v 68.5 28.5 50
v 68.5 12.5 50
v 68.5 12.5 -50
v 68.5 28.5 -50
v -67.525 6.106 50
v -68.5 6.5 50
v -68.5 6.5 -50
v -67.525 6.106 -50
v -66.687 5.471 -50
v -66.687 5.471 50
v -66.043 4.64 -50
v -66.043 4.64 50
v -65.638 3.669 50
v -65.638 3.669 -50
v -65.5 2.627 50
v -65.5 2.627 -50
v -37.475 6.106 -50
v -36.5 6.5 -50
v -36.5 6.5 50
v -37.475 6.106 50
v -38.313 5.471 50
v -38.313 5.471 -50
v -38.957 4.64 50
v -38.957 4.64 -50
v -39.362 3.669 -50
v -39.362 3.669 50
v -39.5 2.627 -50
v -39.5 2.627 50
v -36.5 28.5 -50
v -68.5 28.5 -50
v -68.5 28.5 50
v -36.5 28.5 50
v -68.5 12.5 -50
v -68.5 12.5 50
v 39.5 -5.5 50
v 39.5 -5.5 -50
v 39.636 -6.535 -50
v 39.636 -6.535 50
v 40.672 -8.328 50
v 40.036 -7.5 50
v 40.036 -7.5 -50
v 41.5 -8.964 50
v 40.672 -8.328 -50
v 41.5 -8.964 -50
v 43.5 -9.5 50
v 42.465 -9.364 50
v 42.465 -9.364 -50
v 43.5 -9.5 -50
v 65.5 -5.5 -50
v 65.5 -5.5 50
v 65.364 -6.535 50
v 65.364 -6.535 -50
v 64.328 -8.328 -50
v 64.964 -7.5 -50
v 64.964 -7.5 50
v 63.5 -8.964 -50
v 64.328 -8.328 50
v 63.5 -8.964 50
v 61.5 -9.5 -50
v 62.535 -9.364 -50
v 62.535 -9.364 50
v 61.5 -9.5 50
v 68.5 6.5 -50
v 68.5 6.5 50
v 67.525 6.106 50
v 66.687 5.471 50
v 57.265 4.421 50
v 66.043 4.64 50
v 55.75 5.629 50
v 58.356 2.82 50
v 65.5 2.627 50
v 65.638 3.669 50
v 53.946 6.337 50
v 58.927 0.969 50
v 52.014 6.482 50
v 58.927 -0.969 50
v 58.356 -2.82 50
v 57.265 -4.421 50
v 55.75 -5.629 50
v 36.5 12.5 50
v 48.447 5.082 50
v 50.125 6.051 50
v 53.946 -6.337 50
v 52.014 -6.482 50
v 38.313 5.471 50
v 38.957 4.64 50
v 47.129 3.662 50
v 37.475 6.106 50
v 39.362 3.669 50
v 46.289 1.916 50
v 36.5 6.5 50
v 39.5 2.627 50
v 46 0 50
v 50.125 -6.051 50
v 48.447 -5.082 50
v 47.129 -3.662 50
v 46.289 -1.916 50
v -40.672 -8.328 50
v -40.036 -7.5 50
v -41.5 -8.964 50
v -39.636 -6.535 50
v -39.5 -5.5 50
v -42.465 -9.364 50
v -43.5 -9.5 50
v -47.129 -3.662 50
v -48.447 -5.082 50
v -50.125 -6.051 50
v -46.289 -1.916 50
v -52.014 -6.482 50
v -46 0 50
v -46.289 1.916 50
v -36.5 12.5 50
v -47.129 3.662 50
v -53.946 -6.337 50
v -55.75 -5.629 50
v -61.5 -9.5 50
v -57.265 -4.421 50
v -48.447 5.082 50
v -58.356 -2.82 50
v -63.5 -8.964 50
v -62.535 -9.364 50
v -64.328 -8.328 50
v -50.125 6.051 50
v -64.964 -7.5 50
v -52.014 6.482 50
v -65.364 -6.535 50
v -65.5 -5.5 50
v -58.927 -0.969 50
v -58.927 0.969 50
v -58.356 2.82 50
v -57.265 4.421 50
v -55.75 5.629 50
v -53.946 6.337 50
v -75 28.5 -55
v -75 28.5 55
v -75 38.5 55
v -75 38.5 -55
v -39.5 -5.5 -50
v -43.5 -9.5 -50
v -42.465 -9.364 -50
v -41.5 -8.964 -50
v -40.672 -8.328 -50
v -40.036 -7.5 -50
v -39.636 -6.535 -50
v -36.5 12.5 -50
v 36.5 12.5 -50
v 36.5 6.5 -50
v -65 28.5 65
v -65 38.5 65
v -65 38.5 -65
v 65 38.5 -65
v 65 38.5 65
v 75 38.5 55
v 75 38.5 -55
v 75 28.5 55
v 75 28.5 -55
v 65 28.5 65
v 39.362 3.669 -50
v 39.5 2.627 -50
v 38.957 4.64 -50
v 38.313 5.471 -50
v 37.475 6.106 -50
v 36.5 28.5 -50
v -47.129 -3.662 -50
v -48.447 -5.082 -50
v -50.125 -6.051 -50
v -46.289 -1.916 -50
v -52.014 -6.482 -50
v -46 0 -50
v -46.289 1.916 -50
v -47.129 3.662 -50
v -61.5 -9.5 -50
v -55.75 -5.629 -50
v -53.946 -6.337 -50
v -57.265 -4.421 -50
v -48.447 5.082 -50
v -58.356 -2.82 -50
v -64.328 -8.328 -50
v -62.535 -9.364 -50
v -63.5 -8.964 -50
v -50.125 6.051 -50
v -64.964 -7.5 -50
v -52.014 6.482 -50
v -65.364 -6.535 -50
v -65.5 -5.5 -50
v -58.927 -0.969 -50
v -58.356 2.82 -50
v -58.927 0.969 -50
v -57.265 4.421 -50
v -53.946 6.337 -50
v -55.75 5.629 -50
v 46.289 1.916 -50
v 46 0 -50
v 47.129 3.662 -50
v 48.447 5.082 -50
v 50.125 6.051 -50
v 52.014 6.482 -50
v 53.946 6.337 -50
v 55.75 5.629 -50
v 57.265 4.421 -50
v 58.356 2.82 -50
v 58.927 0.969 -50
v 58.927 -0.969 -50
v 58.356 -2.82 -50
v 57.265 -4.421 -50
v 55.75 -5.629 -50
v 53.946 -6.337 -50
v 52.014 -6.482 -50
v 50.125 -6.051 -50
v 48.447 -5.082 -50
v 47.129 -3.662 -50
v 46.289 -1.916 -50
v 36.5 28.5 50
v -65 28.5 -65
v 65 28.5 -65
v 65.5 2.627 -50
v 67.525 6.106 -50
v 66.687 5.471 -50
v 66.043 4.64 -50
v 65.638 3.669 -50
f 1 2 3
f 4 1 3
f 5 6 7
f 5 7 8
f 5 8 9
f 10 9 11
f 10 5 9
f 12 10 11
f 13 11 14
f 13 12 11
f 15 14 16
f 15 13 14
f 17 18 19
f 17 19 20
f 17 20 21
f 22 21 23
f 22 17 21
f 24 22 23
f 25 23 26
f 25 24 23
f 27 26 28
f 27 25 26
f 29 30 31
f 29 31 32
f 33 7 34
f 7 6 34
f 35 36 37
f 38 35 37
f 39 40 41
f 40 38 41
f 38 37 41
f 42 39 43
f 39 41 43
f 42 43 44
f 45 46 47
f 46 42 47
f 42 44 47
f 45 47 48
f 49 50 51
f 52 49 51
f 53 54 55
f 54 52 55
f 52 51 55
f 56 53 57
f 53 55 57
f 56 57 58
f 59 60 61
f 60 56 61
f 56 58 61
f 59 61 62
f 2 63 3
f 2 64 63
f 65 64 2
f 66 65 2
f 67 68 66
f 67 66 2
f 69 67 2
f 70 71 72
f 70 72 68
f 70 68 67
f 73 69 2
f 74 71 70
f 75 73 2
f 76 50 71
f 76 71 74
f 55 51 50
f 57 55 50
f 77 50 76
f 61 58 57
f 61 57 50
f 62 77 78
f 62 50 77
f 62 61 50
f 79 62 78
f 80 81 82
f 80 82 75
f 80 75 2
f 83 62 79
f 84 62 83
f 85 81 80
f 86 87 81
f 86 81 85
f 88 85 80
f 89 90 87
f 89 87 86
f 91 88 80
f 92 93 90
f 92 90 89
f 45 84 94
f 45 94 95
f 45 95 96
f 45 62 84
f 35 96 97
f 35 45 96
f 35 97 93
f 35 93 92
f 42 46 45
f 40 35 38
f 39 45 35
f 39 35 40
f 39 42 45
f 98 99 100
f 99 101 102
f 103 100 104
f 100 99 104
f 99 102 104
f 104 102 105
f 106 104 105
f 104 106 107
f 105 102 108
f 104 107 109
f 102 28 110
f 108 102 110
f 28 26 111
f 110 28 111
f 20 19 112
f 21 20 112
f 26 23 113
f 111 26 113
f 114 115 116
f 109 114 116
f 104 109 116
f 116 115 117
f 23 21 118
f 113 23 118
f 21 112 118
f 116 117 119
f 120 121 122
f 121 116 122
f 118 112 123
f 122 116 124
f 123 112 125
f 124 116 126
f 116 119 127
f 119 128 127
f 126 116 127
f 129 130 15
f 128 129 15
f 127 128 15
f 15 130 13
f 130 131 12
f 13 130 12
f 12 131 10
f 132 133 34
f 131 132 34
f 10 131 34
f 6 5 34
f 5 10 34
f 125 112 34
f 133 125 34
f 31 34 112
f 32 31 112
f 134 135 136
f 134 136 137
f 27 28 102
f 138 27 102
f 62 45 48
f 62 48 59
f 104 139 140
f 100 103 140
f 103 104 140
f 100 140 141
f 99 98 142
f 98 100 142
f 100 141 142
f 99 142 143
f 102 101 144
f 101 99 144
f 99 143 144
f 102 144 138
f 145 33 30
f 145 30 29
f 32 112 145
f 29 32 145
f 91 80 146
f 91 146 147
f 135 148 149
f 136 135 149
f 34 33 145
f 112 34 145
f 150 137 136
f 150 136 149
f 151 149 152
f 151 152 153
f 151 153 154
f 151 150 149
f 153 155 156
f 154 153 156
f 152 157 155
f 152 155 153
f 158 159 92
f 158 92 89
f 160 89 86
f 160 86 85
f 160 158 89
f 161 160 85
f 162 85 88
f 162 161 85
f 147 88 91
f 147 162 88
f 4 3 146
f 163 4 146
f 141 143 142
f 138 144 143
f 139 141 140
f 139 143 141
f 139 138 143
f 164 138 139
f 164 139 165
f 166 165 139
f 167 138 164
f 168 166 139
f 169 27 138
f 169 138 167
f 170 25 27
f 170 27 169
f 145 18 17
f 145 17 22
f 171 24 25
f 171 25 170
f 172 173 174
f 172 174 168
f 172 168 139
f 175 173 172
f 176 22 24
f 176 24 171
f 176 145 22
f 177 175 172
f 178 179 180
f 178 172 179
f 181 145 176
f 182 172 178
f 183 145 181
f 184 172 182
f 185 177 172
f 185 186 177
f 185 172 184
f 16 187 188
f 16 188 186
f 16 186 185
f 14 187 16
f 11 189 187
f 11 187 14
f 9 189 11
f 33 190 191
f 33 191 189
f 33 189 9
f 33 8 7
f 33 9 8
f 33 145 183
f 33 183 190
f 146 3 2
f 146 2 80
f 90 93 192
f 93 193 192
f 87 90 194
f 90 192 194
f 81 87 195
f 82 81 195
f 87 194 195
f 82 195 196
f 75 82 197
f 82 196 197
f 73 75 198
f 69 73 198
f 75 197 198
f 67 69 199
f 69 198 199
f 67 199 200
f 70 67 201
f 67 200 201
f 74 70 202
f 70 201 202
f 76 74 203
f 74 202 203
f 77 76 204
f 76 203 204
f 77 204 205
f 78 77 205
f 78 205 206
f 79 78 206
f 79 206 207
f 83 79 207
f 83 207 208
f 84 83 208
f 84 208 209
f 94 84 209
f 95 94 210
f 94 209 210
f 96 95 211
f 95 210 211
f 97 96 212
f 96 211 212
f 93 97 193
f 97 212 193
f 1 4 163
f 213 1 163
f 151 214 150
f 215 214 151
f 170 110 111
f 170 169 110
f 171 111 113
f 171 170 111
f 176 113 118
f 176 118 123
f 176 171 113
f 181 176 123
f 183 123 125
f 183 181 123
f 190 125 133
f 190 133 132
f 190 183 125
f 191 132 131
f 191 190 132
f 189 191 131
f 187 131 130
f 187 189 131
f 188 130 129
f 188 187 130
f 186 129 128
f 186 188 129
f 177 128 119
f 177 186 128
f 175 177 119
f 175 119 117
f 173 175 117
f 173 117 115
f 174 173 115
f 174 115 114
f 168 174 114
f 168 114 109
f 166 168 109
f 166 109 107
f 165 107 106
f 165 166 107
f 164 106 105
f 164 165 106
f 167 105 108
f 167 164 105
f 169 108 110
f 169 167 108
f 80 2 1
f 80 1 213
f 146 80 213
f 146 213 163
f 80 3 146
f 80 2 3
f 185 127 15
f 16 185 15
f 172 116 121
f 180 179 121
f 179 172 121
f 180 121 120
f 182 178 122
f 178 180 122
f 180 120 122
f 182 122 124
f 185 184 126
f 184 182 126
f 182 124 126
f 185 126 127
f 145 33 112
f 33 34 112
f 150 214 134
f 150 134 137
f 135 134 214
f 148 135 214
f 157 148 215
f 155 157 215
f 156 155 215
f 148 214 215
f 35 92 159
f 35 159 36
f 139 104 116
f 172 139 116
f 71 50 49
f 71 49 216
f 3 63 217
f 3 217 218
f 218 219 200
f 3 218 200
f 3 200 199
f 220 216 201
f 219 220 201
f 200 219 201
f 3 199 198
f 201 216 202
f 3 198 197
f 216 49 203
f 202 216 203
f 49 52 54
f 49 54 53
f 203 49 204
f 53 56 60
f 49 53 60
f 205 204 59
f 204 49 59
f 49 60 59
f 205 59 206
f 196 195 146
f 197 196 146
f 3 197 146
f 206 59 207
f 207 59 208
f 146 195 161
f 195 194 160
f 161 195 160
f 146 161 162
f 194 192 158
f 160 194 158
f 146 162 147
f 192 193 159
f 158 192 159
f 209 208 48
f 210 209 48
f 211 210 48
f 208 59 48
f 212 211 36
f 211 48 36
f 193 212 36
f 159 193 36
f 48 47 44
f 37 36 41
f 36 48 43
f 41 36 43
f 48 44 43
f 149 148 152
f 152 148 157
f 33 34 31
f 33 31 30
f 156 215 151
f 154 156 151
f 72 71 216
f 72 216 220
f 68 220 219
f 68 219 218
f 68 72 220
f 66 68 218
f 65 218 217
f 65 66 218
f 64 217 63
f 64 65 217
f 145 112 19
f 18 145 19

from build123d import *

# Parameters (mm, degrees)
SKETCH1_R           = 6.5
BOSS_EXTRUDE1_DEPTH = 50
SKETCH2_W           = 32
SKETCH2_H           = 100
BOSS_EXTRUDE2_DEPTH = 16
SKETCH5_W           = 150
SKETCH5_H           = 130
BOSS_EXTRUDE3_DEPTH = 10
CHAMFER1_SIZE       = 10
FILLET1_R           = 4
FILLET2_R           = 4


with BuildPart() as part:
    # Sketch1 → Boss-Extrude1 (new, symmetric)
    with BuildSketch(Plane.XY):
        Polygon((-39.5, -9.5), (-65.5, -9.5), (-65.5, 6.5), (-68.5, 6.5), (-68.5, 12.5), (-36.5, 12.5), (-36.5, 6.5), (-39.5, 6.5), align=None)
        with Locations((-52.5, 0)):
            Circle(SKETCH1_R, mode=Mode.SUBTRACT)
    extrude(amount=BOSS_EXTRUDE1_DEPTH, both=True)


with BuildPart() as body_2:
    # Sketch2 → Boss-Extrude2 (new body)
    with BuildSketch(Plane(origin=(0, 12.5, 0), x_dir=(1, 0, 0), z_dir=(0, 1, 0))):
        with Locations((-52.5, 0)):
            Rectangle(SKETCH2_W, SKETCH2_H)
    extrude(amount=BOSS_EXTRUDE2_DEPTH)


with BuildPart() as body_3:
    # Mirror5: mirrored copy
    add(body_2.part.mirror(Plane(origin=(0, 0, 0), x_dir=(0, 0, 1), z_dir=(1, 0, 0))))


with BuildPart() as body_4:
    # Mirror5 2: mirrored copy
    add(part.part.mirror(Plane(origin=(0, 0, 0), x_dir=(0, 0, 1), z_dir=(1, 0, 0))))

    # Fillet2
    # the kernel refuses this fillet: 4 mm, written as the material it adds along each edge
    with BuildSketch(Plane(origin=(65.5, 6.5, 50), x_dir=(1, 0, 0), z_dir=(0, 0, -1)), Plane(origin=(39.5, 6.5, -50), x_dir=(-1, 0, 0), z_dir=(0, 0, 1))) as fillet2_piece_1:
        with BuildLine():
            CenterArc((4, 3.872983346), FILLET2_R, 180, 75.522487814)
            Line((0, 3.872983346), (0, 0))
            Line((0, 0), (3, 0))
        make_face()
    extrude(amount=100)
    # the kernel refuses this fillet: 4 mm, written as the material it takes off along each edge
    with BuildSketch(Plane(origin=(65.5, -9.5, 60), x_dir=(-1, 0, 0), z_dir=(0, 0, -1)), Plane(origin=(39.5, -9.5, -60), x_dir=(1, 0, 0), z_dir=(0, 0, 1))) as fillet2_2_piece_1:
        with BuildLine():
            CenterArc((FILLET2_R, FILLET2_R), FILLET2_R, 180, 90)
            Line((0, FILLET2_R), (0, 0))
            Line((0, 0), (FILLET2_R, 0))
        make_face()
    extrude(amount=120, mode=Mode.SUBTRACT)


with BuildPart() as body_5:
    # Sketch5 → Boss-Extrude3 (new body)
    with BuildSketch(Plane(origin=(0, 28.5, 0), x_dir=(1, 0, 0), z_dir=(0, 1, 0))):
        Rectangle(SKETCH5_W, SKETCH5_H)
    extrude(amount=BOSS_EXTRUDE3_DEPTH)

    # Chamfer1
    chamfer1_edges = [body_5.edges().sort_by_distance(p)[0] for p in [
        (75, 33.5, 65),
        (-75, 33.5, 65),
        (-75, 33.5, -65),
        (75, 33.5, -65),
    ]]
    chamfer(chamfer1_edges, length=CHAMFER1_SIZE)


with BuildPart() as part_1:
    add(part.part)

    # Fillet1
    # the kernel refuses this fillet: 4 mm, written as the material it adds along each edge
    with BuildSketch(Plane(origin=(-39.5, 6.5, -50), x_dir=(1, 0, 0), z_dir=(0, 0, 1)), Plane(origin=(-65.5, 6.5, 50), x_dir=(-1, 0, 0), z_dir=(0, 0, -1))) as fillet1_piece_1:
        with BuildLine():
            CenterArc((4, -3.872983346), FILLET1_R, 104.477512186, 75.522487814)
            Line((0, -3.872983346), (0, 0))
            Line((0, 0), (3, 0))
        make_face()
    extrude(amount=100)
    # the kernel refuses this fillet: 4 mm, written as the material it takes off along each edge
    with BuildSketch(Plane(origin=(-39.5, -9.5, -60), x_dir=(-1, 0, 0), z_dir=(0, 0, 1)), Plane(origin=(-65.5, -9.5, 60), x_dir=(1, 0, 0), z_dir=(0, 0, -1))) as fillet1_2_piece_1:
        with BuildLine():
            CenterArc((FILLET1_R, -FILLET1_R), FILLET1_R, 90, 90)
            Line((0, -FILLET1_R), (0, 0))
            Line((0, 0), (FILLET1_R, 0))
        make_face()
    extrude(amount=120, mode=Mode.SUBTRACT)


solid = Compound([body_2.part, body_3.part, body_4.part, body_5.part, part_1.part])
